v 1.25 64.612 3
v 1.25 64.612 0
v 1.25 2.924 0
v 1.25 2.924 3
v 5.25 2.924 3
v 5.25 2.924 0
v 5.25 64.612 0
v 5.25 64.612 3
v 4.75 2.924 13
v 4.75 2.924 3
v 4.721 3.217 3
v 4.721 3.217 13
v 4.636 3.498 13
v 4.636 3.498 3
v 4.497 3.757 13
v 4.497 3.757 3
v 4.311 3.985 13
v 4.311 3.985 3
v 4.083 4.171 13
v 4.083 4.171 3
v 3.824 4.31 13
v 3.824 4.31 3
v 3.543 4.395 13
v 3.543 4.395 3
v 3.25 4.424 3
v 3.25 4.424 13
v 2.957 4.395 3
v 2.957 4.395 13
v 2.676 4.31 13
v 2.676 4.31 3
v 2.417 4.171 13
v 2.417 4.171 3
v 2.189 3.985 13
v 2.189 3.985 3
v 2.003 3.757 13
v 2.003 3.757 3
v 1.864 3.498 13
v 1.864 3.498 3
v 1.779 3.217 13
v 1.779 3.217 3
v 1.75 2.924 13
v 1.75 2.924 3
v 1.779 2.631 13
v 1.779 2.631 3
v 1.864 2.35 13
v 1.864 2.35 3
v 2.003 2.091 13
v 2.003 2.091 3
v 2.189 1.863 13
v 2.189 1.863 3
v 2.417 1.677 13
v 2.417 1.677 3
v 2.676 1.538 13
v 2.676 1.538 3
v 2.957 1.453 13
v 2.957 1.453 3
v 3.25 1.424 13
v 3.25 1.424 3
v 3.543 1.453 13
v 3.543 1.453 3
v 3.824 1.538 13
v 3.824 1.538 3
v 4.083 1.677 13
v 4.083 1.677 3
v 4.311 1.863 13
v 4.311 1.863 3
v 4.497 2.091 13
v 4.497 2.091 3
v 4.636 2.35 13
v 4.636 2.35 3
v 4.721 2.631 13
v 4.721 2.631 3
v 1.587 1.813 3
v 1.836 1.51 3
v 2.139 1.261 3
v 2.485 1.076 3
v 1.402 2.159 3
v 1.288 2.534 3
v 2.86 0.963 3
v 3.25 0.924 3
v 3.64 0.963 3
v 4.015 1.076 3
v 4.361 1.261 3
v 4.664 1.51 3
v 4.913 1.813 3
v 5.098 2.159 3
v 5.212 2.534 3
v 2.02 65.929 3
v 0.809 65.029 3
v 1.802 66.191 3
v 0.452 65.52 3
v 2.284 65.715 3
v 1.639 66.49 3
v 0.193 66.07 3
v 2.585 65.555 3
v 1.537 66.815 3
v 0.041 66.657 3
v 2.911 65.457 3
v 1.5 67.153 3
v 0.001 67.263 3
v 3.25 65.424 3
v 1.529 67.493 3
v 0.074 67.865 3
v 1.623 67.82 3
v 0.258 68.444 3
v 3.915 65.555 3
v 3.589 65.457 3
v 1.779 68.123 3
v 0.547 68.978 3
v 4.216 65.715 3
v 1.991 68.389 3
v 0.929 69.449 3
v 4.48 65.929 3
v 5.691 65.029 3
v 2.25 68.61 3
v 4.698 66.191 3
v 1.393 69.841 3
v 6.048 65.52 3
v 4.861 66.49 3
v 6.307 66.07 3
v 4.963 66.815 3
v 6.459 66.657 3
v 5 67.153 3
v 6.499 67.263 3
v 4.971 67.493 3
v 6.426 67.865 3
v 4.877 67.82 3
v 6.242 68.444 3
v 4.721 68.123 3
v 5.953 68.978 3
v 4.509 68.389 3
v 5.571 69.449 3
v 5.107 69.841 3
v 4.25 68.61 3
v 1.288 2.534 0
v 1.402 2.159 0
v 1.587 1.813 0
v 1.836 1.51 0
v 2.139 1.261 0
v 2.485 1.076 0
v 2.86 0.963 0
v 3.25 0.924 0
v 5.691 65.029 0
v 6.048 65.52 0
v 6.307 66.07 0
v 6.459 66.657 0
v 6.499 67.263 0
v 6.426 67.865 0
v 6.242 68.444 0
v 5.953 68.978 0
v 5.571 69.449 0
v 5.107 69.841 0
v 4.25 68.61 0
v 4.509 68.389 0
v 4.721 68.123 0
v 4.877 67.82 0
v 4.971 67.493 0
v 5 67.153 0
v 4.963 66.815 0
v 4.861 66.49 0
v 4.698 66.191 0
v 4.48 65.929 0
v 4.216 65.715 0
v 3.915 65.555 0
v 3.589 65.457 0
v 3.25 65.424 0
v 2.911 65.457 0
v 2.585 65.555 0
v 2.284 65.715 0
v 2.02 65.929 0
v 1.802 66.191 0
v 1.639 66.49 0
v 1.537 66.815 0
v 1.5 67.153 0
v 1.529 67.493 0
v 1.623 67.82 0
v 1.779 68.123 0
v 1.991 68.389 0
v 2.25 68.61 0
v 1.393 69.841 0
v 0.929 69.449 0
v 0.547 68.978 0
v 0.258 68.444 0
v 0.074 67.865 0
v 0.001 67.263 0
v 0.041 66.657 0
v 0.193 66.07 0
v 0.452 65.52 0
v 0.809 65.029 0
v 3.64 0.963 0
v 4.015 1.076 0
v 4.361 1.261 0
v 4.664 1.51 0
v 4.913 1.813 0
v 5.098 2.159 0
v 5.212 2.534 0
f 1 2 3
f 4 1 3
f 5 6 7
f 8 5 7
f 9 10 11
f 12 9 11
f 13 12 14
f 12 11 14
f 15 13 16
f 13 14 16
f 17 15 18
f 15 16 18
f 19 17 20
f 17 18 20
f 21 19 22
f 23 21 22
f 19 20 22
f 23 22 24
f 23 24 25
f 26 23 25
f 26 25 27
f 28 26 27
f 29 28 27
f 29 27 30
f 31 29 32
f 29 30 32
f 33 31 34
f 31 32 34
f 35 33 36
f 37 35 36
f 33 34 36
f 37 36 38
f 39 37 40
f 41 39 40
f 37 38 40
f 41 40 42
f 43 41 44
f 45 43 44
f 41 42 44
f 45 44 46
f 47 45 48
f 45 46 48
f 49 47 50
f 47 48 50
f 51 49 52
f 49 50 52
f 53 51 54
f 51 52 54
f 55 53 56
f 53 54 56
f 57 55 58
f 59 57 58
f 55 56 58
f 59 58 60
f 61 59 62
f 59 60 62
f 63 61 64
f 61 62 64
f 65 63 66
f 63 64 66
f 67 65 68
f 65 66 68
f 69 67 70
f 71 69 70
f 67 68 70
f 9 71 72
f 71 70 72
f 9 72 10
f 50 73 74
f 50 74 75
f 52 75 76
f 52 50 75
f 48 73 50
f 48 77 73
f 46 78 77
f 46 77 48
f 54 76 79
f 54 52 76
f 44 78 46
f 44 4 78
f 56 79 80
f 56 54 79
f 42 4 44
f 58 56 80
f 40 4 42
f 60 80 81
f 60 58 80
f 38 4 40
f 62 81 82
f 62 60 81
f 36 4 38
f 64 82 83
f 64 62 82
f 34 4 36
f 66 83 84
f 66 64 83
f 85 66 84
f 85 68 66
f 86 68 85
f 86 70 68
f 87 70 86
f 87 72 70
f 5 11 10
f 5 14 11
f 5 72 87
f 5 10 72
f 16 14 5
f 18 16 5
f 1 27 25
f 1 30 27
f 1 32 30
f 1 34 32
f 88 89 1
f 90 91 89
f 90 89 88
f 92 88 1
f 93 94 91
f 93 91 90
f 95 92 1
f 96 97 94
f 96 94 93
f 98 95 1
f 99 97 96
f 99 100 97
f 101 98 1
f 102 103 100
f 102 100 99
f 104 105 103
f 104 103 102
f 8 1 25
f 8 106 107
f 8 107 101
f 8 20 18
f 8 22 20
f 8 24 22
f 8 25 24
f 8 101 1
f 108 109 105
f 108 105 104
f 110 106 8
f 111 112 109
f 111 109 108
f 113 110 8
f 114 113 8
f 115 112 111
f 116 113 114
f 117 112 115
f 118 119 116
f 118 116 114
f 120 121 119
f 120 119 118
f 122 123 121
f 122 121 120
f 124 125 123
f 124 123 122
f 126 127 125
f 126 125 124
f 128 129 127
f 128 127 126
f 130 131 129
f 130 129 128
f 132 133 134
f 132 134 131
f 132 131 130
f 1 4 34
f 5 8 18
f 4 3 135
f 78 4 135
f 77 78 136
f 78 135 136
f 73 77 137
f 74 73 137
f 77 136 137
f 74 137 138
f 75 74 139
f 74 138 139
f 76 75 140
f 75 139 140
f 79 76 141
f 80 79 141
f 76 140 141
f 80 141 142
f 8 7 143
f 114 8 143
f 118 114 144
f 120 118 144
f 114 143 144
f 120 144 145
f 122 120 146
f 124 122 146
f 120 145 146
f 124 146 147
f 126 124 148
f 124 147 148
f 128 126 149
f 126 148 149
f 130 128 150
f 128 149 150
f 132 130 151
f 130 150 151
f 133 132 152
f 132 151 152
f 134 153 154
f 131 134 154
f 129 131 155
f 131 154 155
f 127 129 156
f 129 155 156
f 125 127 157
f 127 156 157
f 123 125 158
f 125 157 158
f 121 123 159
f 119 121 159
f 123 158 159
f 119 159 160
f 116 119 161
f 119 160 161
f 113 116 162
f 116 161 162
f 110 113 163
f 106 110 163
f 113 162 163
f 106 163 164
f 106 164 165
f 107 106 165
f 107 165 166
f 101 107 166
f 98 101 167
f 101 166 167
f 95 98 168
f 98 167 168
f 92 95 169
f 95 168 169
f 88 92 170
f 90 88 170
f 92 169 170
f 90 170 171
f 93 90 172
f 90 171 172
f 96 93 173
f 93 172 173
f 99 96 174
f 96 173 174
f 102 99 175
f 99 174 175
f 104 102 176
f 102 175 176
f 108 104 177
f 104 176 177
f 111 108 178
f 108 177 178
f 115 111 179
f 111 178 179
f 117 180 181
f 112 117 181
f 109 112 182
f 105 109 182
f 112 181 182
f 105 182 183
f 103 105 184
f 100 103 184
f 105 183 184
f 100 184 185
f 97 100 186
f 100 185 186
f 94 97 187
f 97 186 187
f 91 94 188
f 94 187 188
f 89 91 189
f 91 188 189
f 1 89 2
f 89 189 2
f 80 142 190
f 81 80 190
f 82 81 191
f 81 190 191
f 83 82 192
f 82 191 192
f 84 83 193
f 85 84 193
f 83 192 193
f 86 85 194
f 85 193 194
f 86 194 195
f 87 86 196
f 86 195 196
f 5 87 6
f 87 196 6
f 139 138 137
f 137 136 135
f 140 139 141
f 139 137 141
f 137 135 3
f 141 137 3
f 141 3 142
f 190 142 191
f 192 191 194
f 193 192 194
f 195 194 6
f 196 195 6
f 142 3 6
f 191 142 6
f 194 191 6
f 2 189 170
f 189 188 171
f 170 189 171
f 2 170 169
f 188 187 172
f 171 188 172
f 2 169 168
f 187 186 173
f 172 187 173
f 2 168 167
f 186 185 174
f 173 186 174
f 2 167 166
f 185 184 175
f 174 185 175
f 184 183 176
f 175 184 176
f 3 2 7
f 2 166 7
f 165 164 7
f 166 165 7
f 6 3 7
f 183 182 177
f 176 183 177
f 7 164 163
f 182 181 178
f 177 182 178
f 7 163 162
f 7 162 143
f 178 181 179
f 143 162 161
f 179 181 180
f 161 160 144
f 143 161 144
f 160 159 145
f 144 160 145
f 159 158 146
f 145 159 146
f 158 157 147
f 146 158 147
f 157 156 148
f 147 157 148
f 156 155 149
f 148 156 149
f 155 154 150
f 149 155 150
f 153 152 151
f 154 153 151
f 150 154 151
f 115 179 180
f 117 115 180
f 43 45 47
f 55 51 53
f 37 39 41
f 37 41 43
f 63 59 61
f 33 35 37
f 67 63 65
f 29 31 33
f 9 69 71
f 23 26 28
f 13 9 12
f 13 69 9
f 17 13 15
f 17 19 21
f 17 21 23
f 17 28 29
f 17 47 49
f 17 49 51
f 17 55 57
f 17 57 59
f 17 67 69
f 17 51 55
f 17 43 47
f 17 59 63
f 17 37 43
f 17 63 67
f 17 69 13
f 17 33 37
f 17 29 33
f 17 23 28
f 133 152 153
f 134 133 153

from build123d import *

# Parameters (mm, degrees)
F1_DEPTH = 3
F2_R     = 1.5
F3_DEPTH = 10


# Not quite as in the source:
# - a feature names something its author has since deleted; it is built from what else it names


with BuildPart() as f1:
    # F0 (on Top) → F1 (new body)
    with BuildSketch(Plane.XY):
        with BuildLine():
            ThreePointArc((3.25, 63.9241337907), (2.1924432633, 64.1010126169), (1.25, 64.6123960992))
            Line((1.25, 64.6123960992), (1.25, 2.9241337907))
            ThreePointArc((1.25, 2.9241337907), (1.8357864376, 4.338347353), (3.25, 4.9241337907))
            Line((3.25, 4.9241337907), (3.25, 63.9241337907))
        make_face()
        with BuildLine():
            ThreePointArc((3.25, 4.9241337907), (1.8357864376, 4.338347353), (1.25, 2.9241337907))
            ThreePointArc((1.25, 2.9241337907), (1.8357864376, 1.5099202283), (3.25, 0.9241337907))
            Line((3.25, 0.9241337907), (3.25, 4.9241337907))
        make_face()
        with BuildLine():
            ThreePointArc((5.25, 64.6123960992), (4.3075567367, 64.1010126169), (3.25, 63.9241337907))
            Line((3.25, 63.9241337907), (3.25, 4.9241337907))
            ThreePointArc((3.25, 4.9241337907), (4.6642135624, 4.338347353), (5.25, 2.9241337907))
            Line((5.25, 2.9241337907), (5.25, 64.6123960992))
        make_face()
        with BuildLine():
            ThreePointArc((5.25, 2.9241337907), (4.6642135624, 4.338347353), (3.25, 4.9241337907))
            Line((3.25, 4.9241337907), (3.25, 0.9241337907))
            ThreePointArc((3.25, 0.9241337907), (4.6642135624, 1.5099202283), (5.25, 2.9241337907))
        make_face()
        with BuildLine():
            Line((2.25, 68.6102744523), (1.3928571429, 69.8412521623))
            ThreePointArc((1.3928571429, 69.8412521623), (0.0012122742, 67.2628936507), (1.25, 64.6123960992))
            ThreePointArc((1.25, 64.6123960992), (2.1924432633, 64.1010126169), (3.25, 63.9241337907))
            ThreePointArc((3.25, 63.9241337907), (4.3075567367, 64.1010126169), (5.25, 64.6123960992))
            ThreePointArc((5.25, 64.6123960992), (6.4987877258, 67.2628936507), (5.1071428571, 69.8412521623))
            Line((5.1071428571, 69.8412521623), (4.25, 68.6102744523))
            ThreePointArc((4.25, 68.6102744523), (3.25, 65.4241337907), (2.25, 68.6102744523))
        make_face()
    extrude(amount=F1_DEPTH)

    # F2 (on face) → F3 (join)
    with BuildSketch(Plane.XY.offset(3)):
        with Locations((3.25, 2.9241337907)):
            Circle(F2_R)
    extrude(amount=F3_DEPTH)


solid = f1.part
